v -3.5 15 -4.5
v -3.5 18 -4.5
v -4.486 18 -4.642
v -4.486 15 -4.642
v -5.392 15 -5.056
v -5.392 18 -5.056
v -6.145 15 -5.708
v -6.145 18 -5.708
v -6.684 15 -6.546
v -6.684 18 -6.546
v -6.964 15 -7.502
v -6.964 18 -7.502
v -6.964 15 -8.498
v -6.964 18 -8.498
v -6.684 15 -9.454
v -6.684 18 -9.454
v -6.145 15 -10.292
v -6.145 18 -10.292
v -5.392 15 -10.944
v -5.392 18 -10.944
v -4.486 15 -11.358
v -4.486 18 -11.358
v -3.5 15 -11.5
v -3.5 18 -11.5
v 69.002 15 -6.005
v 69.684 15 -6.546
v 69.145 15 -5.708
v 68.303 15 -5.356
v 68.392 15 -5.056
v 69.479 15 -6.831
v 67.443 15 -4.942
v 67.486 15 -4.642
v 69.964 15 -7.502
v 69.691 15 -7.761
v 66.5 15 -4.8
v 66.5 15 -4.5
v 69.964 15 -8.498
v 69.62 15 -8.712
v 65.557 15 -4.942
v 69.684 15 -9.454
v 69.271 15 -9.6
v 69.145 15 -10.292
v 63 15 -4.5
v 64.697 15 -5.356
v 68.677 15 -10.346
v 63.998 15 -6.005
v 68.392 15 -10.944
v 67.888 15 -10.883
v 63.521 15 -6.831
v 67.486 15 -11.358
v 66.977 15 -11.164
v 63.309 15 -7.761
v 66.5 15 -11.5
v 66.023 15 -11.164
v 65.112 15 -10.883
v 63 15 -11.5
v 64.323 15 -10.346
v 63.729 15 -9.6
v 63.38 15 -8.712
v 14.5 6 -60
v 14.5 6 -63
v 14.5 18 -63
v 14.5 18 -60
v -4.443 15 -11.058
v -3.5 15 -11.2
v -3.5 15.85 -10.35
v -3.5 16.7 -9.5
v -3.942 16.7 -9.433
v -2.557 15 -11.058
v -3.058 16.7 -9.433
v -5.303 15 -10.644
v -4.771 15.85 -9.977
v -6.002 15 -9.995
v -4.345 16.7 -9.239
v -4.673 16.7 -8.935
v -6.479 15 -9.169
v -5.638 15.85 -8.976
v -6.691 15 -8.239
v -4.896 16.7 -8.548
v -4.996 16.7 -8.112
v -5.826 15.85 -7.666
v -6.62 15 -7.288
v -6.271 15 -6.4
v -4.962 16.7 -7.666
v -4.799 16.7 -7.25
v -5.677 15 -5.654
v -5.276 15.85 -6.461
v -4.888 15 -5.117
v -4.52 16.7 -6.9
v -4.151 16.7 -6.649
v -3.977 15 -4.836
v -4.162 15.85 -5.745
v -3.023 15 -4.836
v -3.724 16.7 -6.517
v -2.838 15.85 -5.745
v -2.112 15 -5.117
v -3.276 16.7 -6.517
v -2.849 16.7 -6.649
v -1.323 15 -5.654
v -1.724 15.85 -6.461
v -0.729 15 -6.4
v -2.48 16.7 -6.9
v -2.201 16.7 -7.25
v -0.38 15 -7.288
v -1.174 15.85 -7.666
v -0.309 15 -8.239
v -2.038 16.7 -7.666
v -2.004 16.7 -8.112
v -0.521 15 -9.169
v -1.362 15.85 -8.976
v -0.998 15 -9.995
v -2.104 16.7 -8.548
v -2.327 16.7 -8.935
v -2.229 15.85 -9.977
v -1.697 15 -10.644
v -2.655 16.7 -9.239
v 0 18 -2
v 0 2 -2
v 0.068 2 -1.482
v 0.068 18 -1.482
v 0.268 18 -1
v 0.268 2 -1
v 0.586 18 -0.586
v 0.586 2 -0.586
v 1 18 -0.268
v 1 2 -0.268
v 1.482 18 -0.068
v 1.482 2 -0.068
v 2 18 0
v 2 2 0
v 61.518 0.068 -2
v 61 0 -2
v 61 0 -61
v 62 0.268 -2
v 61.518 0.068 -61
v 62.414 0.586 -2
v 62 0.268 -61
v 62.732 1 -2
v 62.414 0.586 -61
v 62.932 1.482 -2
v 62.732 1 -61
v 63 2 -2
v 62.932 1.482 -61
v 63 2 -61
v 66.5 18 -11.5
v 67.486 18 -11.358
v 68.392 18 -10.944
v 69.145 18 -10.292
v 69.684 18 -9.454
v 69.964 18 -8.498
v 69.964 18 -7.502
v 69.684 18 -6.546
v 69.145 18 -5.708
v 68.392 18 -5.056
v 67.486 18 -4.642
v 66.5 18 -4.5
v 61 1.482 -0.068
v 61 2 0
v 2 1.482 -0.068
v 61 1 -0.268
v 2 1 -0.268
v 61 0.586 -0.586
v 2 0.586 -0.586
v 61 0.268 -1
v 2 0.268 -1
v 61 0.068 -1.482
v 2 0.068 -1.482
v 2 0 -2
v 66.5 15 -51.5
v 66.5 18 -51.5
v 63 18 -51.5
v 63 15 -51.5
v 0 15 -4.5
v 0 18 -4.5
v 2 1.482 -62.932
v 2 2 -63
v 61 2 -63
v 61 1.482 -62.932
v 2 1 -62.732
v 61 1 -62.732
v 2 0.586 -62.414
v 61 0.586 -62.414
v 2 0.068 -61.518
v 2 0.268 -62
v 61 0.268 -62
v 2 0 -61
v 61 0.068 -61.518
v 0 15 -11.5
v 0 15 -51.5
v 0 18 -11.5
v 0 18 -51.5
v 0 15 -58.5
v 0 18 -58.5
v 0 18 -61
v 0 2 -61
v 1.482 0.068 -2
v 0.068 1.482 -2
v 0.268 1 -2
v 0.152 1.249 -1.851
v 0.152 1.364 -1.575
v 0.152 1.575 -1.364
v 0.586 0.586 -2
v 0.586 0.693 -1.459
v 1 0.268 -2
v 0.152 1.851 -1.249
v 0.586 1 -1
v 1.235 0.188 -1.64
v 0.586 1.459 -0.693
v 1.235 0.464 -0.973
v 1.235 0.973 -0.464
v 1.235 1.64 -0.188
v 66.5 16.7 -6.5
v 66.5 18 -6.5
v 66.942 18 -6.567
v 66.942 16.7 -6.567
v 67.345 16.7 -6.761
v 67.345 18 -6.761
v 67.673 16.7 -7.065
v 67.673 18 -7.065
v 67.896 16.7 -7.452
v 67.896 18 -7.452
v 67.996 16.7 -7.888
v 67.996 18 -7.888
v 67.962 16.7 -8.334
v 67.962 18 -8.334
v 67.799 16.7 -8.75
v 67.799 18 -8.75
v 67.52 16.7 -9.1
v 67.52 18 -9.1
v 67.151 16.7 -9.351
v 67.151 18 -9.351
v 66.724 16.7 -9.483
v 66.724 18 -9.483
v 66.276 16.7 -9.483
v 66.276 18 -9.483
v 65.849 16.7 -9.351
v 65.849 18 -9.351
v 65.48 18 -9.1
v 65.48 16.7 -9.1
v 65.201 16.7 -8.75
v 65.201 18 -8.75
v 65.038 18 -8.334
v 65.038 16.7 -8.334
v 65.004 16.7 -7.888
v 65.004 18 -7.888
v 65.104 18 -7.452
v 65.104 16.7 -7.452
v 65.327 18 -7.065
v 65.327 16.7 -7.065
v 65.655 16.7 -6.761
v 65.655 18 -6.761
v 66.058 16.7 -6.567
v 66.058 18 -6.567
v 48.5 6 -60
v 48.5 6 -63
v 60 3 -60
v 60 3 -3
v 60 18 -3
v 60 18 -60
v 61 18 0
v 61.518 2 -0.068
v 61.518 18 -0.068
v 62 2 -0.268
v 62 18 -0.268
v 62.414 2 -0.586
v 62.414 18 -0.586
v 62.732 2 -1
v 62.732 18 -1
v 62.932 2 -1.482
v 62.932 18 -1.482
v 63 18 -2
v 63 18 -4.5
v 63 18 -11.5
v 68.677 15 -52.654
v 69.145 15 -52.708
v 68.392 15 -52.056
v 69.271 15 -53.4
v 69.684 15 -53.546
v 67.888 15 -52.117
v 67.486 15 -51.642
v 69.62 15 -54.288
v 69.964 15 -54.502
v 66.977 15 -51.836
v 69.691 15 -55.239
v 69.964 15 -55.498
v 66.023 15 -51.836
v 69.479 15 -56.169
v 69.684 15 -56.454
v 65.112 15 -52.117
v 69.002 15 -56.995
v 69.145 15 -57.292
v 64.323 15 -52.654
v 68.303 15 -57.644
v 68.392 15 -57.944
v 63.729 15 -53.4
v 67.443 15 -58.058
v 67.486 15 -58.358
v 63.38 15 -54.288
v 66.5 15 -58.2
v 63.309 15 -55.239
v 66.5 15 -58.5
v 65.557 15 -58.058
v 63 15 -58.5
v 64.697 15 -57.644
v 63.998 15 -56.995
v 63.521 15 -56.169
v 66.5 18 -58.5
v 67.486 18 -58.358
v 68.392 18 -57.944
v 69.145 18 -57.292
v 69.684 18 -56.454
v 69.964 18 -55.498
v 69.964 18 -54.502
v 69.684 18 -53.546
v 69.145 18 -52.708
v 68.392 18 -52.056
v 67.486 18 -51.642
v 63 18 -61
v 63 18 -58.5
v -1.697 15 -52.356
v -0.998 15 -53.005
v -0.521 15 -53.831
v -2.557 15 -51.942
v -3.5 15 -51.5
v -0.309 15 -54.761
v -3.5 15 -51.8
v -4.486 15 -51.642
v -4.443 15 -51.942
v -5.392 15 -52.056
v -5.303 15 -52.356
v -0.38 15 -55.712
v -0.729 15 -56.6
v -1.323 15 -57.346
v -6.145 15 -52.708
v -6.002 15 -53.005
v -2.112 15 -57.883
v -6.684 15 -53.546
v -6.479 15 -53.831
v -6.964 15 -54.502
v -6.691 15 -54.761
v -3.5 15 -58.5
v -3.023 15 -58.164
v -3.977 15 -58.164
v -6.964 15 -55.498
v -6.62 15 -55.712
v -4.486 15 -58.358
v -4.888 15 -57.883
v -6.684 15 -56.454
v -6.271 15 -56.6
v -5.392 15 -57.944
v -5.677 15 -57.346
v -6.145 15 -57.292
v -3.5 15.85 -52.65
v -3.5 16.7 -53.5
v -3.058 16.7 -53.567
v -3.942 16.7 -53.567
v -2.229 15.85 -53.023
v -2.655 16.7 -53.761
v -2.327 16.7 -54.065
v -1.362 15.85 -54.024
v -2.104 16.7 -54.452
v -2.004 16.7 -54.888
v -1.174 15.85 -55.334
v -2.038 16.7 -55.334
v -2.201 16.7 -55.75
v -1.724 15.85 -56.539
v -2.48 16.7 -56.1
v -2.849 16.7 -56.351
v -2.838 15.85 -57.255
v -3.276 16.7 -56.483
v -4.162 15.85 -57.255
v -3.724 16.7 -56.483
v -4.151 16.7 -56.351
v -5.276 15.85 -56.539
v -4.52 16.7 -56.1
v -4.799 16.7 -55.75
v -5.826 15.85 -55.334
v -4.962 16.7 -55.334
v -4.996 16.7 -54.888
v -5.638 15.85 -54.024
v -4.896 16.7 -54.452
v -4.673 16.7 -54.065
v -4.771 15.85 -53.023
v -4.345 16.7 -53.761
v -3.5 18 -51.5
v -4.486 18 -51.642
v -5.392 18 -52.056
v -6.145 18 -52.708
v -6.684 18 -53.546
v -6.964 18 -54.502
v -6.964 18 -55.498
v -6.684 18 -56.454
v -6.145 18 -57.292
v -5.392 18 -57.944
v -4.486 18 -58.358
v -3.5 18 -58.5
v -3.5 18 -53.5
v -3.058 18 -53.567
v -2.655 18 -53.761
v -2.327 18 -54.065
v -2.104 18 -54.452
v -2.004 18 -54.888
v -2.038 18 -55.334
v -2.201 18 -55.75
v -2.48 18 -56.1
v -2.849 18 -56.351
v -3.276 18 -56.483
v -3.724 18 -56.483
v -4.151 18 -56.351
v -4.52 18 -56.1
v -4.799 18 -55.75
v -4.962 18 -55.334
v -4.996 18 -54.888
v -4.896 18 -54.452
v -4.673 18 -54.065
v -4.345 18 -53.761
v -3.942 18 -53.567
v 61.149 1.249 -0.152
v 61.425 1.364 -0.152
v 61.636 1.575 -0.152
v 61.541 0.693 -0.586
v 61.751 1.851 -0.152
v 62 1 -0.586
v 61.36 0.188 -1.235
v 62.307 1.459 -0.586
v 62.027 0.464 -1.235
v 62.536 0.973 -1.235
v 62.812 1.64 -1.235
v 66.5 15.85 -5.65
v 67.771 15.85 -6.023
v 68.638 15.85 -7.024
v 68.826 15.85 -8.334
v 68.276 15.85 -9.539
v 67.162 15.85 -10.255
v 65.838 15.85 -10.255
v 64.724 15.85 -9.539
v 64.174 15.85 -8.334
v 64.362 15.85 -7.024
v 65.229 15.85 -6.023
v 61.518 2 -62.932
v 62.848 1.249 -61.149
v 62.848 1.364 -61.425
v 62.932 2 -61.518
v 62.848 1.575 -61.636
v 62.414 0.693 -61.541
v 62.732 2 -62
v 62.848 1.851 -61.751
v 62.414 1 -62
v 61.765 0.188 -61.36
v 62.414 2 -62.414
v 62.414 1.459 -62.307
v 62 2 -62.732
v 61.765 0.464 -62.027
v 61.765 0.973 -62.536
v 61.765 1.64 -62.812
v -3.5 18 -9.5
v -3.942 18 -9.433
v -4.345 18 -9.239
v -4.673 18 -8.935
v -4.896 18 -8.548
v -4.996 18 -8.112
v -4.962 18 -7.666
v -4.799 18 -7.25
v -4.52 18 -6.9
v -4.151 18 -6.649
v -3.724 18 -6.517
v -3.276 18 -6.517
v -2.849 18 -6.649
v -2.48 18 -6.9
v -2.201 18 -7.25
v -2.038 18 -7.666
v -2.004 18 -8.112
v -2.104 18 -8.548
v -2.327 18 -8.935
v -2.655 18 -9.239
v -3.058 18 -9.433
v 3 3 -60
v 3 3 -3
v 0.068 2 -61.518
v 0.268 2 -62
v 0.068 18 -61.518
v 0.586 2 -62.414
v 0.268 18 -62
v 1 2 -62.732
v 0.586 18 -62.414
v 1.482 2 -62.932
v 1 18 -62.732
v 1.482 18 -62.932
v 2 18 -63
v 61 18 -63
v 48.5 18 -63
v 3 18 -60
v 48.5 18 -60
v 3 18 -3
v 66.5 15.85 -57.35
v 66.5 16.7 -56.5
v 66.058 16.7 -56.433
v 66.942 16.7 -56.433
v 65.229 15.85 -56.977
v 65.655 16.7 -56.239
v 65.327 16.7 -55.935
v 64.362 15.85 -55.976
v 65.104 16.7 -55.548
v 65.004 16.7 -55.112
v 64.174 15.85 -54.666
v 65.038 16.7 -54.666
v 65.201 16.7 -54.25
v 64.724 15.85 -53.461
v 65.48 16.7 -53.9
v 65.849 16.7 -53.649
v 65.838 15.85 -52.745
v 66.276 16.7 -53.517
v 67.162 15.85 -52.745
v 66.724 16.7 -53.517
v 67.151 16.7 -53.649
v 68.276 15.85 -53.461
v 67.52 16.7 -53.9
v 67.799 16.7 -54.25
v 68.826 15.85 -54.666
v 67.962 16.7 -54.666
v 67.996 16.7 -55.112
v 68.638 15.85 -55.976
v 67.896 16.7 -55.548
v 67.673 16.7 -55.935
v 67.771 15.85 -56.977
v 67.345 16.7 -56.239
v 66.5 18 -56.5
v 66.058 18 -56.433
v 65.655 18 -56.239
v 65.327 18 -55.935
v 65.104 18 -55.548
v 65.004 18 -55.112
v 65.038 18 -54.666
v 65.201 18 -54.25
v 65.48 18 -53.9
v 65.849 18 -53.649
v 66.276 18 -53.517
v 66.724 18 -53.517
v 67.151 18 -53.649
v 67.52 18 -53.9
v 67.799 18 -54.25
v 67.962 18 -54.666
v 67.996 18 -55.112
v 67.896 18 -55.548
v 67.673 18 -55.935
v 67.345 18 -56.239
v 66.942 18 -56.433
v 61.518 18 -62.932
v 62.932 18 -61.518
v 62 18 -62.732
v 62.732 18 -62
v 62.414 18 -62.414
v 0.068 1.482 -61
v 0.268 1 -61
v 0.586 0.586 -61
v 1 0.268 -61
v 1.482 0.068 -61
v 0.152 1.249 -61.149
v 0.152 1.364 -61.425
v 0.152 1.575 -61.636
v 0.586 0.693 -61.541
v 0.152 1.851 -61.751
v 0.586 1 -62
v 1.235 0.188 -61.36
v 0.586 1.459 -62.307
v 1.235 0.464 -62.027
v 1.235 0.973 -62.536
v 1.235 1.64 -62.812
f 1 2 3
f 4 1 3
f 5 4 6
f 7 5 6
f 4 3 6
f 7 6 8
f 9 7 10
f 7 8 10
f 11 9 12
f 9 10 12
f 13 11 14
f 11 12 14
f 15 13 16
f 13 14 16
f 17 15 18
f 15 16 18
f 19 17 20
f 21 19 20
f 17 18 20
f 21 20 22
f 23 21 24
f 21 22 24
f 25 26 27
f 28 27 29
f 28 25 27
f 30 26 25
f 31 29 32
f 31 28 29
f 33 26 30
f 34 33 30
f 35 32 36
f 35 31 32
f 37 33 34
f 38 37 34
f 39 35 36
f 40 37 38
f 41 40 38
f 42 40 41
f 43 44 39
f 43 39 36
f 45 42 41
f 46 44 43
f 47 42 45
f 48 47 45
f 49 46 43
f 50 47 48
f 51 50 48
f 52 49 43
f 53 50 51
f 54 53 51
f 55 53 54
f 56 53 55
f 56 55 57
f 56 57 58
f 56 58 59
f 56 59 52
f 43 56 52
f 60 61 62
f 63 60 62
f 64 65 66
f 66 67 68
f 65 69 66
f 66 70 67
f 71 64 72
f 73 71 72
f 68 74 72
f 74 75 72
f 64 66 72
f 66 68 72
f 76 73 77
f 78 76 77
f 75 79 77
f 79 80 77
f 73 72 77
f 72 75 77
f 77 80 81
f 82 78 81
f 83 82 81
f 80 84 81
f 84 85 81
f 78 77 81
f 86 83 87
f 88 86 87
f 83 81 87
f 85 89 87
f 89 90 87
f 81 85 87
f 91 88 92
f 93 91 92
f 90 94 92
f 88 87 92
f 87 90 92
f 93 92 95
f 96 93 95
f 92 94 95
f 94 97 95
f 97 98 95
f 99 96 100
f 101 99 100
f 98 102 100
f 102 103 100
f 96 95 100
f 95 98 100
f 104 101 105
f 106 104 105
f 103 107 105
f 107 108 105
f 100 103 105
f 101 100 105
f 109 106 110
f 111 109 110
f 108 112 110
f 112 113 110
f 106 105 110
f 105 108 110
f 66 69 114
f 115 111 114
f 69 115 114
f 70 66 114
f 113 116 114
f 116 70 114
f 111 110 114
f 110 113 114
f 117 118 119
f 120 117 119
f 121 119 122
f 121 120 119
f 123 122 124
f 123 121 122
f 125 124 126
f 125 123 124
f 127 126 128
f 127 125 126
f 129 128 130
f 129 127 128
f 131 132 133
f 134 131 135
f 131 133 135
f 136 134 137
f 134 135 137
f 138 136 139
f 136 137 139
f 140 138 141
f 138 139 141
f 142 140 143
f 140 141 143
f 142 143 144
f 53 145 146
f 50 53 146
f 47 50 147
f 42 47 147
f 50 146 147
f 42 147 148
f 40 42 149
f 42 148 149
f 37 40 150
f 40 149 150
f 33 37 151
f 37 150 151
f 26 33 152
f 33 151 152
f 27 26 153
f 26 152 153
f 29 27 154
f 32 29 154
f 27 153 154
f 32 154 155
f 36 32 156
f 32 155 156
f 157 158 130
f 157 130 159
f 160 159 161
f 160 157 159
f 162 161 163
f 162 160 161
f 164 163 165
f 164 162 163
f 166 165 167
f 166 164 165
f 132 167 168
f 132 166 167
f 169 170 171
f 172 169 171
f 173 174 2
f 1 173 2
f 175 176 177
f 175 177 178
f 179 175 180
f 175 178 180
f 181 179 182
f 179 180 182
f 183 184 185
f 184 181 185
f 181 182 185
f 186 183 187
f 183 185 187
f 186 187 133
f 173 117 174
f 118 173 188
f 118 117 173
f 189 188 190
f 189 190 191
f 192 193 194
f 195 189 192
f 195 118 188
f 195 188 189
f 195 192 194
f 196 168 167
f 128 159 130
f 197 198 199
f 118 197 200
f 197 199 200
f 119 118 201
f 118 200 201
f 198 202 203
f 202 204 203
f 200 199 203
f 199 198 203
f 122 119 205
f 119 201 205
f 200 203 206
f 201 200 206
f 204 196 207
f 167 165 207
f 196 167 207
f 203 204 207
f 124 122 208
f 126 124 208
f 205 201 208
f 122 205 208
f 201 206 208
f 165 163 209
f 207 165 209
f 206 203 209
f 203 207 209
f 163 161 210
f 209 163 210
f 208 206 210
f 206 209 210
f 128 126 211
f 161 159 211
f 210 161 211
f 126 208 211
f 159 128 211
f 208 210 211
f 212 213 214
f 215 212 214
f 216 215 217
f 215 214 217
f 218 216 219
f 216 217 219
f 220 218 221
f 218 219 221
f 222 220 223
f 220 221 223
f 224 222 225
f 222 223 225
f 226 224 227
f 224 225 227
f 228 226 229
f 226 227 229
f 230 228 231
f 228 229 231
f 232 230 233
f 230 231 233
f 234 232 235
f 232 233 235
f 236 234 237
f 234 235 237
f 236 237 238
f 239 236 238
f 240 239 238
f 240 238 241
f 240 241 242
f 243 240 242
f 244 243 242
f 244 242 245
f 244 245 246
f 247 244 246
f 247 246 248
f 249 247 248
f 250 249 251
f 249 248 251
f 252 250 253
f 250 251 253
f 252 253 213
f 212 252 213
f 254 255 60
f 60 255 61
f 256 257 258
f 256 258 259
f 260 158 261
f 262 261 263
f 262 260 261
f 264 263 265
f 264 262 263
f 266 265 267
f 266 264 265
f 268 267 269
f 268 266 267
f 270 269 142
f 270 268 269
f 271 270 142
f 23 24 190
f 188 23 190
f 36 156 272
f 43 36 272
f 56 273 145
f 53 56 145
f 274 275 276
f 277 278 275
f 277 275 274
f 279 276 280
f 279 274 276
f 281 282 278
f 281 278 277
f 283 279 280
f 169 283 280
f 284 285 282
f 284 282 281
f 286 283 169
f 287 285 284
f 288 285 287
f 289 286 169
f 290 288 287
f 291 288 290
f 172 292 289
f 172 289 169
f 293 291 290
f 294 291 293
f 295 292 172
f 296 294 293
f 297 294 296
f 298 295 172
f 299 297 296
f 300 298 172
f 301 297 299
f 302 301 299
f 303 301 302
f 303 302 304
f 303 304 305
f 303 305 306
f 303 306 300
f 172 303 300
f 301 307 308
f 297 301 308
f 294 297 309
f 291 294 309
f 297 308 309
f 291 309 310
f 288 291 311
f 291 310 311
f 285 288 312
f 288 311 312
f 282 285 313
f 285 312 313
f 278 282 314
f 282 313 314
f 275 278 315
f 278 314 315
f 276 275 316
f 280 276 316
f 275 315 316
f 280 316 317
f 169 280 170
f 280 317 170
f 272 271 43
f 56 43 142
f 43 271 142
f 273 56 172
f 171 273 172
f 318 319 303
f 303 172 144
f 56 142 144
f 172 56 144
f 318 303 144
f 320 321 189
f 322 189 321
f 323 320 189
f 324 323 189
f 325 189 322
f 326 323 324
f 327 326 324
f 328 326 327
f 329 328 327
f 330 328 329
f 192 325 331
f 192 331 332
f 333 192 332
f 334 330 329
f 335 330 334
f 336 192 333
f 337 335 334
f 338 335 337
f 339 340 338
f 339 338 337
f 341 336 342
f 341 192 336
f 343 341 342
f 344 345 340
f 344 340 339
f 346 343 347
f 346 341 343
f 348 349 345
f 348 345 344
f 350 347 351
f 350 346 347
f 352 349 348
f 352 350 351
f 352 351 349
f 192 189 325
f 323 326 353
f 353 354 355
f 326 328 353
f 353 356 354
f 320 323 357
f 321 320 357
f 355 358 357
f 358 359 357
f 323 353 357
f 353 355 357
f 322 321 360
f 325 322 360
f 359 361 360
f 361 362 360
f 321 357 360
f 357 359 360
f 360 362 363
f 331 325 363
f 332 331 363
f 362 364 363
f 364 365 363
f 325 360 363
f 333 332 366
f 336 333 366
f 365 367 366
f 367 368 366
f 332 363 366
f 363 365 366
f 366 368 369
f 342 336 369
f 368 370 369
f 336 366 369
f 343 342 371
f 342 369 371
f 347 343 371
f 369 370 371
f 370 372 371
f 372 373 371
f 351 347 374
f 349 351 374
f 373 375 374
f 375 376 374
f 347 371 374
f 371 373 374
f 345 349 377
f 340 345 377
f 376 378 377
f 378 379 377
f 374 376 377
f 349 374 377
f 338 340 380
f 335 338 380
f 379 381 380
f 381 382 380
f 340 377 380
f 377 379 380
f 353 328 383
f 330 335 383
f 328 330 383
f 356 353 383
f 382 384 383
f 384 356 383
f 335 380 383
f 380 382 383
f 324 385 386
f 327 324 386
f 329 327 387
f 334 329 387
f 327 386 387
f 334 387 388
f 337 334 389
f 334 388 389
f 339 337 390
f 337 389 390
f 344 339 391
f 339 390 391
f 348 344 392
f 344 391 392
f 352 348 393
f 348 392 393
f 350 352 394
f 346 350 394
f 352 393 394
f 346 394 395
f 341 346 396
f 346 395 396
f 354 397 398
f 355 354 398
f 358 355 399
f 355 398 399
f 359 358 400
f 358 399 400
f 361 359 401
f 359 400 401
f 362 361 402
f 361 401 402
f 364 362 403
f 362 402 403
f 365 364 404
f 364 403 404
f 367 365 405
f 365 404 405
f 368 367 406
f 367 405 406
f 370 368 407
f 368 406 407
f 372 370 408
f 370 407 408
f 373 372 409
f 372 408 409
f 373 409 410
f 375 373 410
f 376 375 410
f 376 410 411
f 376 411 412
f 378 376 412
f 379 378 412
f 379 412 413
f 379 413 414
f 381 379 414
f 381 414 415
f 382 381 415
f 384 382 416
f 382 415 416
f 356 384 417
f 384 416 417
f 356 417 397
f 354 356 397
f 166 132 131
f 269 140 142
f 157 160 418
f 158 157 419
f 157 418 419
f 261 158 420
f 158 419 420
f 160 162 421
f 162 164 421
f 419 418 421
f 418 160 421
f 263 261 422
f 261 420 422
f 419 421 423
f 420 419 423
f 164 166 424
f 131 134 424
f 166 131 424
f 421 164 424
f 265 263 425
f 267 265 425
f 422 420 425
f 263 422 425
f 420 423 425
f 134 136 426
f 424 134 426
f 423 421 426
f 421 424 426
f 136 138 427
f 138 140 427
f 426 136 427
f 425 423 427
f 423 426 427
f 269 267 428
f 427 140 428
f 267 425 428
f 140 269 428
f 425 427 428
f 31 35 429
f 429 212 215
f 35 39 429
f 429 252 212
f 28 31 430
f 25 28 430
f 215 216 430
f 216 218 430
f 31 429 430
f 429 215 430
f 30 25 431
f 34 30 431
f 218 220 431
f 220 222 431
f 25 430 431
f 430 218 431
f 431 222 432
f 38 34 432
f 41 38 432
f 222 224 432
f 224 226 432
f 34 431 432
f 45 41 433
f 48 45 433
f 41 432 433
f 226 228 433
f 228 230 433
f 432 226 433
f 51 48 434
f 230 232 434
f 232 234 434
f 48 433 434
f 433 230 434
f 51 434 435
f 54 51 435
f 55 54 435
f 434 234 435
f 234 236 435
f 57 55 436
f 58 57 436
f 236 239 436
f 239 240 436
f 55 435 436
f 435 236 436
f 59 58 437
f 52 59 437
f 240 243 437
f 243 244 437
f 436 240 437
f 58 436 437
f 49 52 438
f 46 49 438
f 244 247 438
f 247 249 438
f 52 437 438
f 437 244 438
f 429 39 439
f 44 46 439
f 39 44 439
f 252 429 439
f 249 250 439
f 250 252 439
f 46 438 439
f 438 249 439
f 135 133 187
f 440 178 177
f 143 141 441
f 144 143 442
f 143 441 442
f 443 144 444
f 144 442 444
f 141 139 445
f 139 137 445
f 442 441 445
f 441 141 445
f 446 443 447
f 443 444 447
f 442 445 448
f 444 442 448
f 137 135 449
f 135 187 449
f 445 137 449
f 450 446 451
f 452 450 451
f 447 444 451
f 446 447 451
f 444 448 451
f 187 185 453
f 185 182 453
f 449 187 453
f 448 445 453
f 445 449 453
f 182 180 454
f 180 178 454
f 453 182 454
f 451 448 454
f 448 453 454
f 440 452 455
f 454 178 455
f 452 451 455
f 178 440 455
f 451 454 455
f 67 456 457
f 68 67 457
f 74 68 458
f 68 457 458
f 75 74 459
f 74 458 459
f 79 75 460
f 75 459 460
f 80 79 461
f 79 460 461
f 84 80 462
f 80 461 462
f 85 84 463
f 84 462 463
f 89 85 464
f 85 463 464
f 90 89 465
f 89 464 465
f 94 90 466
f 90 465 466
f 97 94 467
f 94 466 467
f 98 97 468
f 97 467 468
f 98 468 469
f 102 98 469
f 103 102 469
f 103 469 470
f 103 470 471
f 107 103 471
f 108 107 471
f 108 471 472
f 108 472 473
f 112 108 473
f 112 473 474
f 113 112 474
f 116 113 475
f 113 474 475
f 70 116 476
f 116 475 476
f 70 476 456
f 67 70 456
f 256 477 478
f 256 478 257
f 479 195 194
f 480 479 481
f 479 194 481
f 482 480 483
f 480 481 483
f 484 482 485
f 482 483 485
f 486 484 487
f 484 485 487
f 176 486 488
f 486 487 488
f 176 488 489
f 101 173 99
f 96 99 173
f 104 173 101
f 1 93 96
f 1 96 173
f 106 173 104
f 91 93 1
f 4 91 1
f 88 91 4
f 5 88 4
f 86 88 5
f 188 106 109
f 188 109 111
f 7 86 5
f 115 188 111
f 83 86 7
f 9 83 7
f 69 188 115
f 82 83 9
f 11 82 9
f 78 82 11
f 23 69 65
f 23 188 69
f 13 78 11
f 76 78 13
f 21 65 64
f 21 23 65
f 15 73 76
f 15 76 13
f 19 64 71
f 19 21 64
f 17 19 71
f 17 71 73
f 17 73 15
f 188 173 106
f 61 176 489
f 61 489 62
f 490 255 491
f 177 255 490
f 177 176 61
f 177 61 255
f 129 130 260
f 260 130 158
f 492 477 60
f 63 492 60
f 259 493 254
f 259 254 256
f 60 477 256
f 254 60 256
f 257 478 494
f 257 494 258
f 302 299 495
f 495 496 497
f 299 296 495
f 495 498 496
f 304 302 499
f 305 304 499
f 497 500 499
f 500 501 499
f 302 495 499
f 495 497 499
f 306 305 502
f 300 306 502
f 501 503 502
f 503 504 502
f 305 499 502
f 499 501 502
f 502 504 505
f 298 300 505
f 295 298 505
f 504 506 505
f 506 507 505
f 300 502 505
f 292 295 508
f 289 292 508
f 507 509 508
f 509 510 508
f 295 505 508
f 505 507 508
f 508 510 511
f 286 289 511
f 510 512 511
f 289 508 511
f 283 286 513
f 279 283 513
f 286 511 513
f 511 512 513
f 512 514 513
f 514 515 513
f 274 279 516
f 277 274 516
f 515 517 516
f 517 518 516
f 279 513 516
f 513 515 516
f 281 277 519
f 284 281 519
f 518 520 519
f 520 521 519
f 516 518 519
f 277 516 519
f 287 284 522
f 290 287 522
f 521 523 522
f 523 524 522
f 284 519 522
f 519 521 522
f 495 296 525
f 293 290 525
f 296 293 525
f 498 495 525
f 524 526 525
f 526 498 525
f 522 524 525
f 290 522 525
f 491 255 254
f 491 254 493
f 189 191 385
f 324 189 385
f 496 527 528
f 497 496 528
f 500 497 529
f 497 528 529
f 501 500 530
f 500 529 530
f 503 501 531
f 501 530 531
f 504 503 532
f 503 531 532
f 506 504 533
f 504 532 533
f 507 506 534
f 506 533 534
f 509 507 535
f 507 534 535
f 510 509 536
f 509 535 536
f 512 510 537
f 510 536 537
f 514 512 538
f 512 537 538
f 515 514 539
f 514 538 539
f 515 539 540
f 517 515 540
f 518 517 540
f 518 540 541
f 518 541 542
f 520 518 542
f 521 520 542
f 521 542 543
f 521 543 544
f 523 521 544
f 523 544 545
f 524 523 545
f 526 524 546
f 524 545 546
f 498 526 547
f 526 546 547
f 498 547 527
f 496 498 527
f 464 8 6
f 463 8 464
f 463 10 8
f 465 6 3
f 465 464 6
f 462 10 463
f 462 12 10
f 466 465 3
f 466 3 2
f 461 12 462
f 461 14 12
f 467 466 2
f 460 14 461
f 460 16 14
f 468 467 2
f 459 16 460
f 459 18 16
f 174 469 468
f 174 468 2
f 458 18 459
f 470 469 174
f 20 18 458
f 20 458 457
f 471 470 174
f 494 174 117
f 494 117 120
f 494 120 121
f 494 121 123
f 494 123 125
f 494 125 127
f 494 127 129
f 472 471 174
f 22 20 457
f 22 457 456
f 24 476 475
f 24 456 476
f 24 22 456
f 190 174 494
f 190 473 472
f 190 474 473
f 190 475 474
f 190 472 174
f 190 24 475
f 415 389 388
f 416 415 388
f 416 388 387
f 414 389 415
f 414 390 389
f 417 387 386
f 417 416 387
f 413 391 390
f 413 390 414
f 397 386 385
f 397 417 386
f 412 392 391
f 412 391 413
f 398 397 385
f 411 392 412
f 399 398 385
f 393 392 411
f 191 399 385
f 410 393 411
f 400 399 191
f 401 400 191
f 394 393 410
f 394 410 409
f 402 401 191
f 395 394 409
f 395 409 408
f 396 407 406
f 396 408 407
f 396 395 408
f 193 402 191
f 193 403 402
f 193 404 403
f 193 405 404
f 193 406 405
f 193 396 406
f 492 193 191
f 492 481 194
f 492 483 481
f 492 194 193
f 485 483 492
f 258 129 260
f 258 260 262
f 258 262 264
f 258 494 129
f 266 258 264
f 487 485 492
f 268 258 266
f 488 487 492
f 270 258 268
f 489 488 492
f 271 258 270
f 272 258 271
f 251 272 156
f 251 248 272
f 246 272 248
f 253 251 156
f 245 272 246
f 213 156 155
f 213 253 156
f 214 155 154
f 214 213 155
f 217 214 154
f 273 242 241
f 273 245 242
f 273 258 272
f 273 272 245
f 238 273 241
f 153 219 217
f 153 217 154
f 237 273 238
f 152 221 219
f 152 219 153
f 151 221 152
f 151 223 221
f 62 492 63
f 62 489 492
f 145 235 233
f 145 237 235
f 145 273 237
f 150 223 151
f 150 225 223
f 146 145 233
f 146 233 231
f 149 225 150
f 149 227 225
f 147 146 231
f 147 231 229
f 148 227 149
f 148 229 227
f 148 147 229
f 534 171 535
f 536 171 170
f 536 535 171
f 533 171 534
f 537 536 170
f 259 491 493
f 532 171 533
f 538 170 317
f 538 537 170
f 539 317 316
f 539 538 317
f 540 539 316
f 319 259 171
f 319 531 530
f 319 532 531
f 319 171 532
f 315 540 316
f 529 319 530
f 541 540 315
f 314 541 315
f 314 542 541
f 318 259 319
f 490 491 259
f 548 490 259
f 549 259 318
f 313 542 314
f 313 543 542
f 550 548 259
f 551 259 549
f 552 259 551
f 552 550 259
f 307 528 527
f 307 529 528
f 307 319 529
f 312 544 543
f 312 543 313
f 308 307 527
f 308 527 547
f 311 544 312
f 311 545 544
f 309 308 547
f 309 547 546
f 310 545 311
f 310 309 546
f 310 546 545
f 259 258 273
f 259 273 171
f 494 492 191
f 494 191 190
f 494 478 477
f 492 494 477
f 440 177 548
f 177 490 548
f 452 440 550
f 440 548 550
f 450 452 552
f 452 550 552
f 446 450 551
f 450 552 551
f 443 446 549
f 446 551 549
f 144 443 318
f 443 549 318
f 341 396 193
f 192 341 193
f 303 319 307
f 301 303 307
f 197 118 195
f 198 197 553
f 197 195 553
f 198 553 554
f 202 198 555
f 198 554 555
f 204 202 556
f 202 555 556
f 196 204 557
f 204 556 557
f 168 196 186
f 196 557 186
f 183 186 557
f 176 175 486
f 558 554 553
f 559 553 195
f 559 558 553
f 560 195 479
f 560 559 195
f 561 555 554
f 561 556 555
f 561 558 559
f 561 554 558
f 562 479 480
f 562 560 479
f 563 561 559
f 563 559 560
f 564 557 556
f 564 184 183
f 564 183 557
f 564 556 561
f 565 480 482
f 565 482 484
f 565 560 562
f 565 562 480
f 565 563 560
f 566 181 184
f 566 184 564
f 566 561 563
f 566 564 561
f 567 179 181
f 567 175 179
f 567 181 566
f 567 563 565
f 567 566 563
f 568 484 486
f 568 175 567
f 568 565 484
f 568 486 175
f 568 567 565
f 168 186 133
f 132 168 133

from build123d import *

# Parameters (mm, degrees)
SKETCH1_W           = 63
SKETCH1_H           = 63
BOSS_EXTRUDE1_DEPTH = 18
SHELL2_T            = -3
SKETCH2_W           = 34
SKETCH2_H           = 12
CUT_EXTRUDE1_DEPTH  = 3
FILLET2_R           = 2
SKETCH4_R           = 1.5
BOSS_EXTRUDE2_DEPTH = 3
CHAMFER1_SIZE       = 1.7


with BuildPart() as part:
    # Sketch1 → Boss-Extrude1 (new body)
    with BuildSketch(Plane(origin=(0, 0, 0), x_dir=(1, 0, 0), z_dir=(0, 1, 0))):
        with Locations((31.5, 31.5)):
            Rectangle(SKETCH1_W, SKETCH1_H)
    extrude(amount=BOSS_EXTRUDE1_DEPTH)

    # Shell2
    shell2_openings = [part.faces().sort_by_distance(p)[0] for p in [
        (31.5, 18, -31.5),
    ]]
    offset(amount=SHELL2_T, openings=shell2_openings, kind=Kind.INTERSECTION)

    # Sketch2 → Cut-Extrude1 (cut)
    with BuildSketch(Plane(origin=(0, 0, -63), x_dir=(-1, 0, 0), z_dir=(0, 0, -1))):
        with Locations((-31.5, 12)):
            Rectangle(SKETCH2_W, SKETCH2_H)
    extrude(amount=-CUT_EXTRUDE1_DEPTH, mode=Mode.SUBTRACT)

    # Fillet2
    fillet2_edges = [part.edges().sort_by_distance(p)[0] for p in [
        (31.5, 0, -63),
        (63, 0, -31.5),
        (31.5, 0, 0),
        (0, 0, -31.5),
        (0, 9, -63),
        (63, 9, -63),
        (63, 9, 0),
        (0, 9, 0),
    ]]
    fillet(fillet2_edges, radius=FILLET2_R)

    # Sketch4 → Boss-Extrude2 (add)
    # profile 1 of 4: a face of its own
    with BuildSketch(Plane(origin=(0, 18, 0), x_dir=(1, 0, 0), z_dir=(0, 1, 0))):
        with BuildLine():
            Line((0, 58.5), (0, 51.5))
            Line((0, 51.5), (-3.5, 51.5))
            ThreePointArc((-3.5, 51.5), (-7, 55), (-3.5, 58.5))
            Line((-3.5, 58.5), (0, 58.5))
        make_face()
        with Locations(Location((-3.5, 55, 0), (0, 0, 270))):
            Circle(SKETCH4_R, mode=Mode.SUBTRACT)
    # profile 2 of 4: a face of its own
    with BuildSketch(Plane(origin=(0, 18, 0), x_dir=(1, 0, 0), z_dir=(0, 1, 0))):
        with BuildLine():
            Line((66.5, 51.5), (63, 51.5))
            Line((63, 51.5), (63, 58.5))
            Line((63, 58.5), (66.5, 58.5))
            ThreePointArc((66.5, 58.5), (70, 55), (66.5, 51.5))
        make_face()
        with Locations(Location((66.5, 55, 0), (0, 0, 90))):
            Circle(SKETCH4_R, mode=Mode.SUBTRACT)
    # profile 3 of 4: a face of its own
    with BuildSketch(Plane(origin=(0, 18, 0), x_dir=(1, 0, 0), z_dir=(0, 1, 0))):
        with BuildLine():
            Line((63, 4.5), (63, 11.5))
            Line((63, 11.5), (66.5, 11.5))
            ThreePointArc((66.5, 11.5), (70, 8), (66.5, 4.5))
            Line((66.5, 4.5), (63, 4.5))
        make_face()
        with Locations(Location((66.5, 8, 0), (0, 0, 270))):
            Circle(SKETCH4_R, mode=Mode.SUBTRACT)
    # profile 4 of 4: a face of its own
    with BuildSketch(Plane(origin=(0, 18, 0), x_dir=(1, 0, 0), z_dir=(0, 1, 0))):
        with BuildLine():
            Line((-3.5, 11.5), (0, 11.5))
            Line((0, 11.5), (0, 4.5))
            Line((0, 4.5), (-3.5, 4.5))
            ThreePointArc((-3.5, 4.5), (-7, 8), (-3.5, 11.5))
        make_face()
        with Locations(Location((-3.5, 8, 0), (0, 0, 90))):
            Circle(SKETCH4_R, mode=Mode.SUBTRACT)
    extrude(amount=-BOSS_EXTRUDE2_DEPTH)

    # Chamfer1
    chamfer1_edges = [part.edges().sort_by_distance(p)[0] for p in [
        (66.5, 15, -9.5),
        (-3.5, 15, -6.5),
        (-3.5, 15, -56.5),
        (66.5, 15, -53.5),
    ]]
    chamfer(chamfer1_edges, length=CHAMFER1_SIZE)


solid = part.part
